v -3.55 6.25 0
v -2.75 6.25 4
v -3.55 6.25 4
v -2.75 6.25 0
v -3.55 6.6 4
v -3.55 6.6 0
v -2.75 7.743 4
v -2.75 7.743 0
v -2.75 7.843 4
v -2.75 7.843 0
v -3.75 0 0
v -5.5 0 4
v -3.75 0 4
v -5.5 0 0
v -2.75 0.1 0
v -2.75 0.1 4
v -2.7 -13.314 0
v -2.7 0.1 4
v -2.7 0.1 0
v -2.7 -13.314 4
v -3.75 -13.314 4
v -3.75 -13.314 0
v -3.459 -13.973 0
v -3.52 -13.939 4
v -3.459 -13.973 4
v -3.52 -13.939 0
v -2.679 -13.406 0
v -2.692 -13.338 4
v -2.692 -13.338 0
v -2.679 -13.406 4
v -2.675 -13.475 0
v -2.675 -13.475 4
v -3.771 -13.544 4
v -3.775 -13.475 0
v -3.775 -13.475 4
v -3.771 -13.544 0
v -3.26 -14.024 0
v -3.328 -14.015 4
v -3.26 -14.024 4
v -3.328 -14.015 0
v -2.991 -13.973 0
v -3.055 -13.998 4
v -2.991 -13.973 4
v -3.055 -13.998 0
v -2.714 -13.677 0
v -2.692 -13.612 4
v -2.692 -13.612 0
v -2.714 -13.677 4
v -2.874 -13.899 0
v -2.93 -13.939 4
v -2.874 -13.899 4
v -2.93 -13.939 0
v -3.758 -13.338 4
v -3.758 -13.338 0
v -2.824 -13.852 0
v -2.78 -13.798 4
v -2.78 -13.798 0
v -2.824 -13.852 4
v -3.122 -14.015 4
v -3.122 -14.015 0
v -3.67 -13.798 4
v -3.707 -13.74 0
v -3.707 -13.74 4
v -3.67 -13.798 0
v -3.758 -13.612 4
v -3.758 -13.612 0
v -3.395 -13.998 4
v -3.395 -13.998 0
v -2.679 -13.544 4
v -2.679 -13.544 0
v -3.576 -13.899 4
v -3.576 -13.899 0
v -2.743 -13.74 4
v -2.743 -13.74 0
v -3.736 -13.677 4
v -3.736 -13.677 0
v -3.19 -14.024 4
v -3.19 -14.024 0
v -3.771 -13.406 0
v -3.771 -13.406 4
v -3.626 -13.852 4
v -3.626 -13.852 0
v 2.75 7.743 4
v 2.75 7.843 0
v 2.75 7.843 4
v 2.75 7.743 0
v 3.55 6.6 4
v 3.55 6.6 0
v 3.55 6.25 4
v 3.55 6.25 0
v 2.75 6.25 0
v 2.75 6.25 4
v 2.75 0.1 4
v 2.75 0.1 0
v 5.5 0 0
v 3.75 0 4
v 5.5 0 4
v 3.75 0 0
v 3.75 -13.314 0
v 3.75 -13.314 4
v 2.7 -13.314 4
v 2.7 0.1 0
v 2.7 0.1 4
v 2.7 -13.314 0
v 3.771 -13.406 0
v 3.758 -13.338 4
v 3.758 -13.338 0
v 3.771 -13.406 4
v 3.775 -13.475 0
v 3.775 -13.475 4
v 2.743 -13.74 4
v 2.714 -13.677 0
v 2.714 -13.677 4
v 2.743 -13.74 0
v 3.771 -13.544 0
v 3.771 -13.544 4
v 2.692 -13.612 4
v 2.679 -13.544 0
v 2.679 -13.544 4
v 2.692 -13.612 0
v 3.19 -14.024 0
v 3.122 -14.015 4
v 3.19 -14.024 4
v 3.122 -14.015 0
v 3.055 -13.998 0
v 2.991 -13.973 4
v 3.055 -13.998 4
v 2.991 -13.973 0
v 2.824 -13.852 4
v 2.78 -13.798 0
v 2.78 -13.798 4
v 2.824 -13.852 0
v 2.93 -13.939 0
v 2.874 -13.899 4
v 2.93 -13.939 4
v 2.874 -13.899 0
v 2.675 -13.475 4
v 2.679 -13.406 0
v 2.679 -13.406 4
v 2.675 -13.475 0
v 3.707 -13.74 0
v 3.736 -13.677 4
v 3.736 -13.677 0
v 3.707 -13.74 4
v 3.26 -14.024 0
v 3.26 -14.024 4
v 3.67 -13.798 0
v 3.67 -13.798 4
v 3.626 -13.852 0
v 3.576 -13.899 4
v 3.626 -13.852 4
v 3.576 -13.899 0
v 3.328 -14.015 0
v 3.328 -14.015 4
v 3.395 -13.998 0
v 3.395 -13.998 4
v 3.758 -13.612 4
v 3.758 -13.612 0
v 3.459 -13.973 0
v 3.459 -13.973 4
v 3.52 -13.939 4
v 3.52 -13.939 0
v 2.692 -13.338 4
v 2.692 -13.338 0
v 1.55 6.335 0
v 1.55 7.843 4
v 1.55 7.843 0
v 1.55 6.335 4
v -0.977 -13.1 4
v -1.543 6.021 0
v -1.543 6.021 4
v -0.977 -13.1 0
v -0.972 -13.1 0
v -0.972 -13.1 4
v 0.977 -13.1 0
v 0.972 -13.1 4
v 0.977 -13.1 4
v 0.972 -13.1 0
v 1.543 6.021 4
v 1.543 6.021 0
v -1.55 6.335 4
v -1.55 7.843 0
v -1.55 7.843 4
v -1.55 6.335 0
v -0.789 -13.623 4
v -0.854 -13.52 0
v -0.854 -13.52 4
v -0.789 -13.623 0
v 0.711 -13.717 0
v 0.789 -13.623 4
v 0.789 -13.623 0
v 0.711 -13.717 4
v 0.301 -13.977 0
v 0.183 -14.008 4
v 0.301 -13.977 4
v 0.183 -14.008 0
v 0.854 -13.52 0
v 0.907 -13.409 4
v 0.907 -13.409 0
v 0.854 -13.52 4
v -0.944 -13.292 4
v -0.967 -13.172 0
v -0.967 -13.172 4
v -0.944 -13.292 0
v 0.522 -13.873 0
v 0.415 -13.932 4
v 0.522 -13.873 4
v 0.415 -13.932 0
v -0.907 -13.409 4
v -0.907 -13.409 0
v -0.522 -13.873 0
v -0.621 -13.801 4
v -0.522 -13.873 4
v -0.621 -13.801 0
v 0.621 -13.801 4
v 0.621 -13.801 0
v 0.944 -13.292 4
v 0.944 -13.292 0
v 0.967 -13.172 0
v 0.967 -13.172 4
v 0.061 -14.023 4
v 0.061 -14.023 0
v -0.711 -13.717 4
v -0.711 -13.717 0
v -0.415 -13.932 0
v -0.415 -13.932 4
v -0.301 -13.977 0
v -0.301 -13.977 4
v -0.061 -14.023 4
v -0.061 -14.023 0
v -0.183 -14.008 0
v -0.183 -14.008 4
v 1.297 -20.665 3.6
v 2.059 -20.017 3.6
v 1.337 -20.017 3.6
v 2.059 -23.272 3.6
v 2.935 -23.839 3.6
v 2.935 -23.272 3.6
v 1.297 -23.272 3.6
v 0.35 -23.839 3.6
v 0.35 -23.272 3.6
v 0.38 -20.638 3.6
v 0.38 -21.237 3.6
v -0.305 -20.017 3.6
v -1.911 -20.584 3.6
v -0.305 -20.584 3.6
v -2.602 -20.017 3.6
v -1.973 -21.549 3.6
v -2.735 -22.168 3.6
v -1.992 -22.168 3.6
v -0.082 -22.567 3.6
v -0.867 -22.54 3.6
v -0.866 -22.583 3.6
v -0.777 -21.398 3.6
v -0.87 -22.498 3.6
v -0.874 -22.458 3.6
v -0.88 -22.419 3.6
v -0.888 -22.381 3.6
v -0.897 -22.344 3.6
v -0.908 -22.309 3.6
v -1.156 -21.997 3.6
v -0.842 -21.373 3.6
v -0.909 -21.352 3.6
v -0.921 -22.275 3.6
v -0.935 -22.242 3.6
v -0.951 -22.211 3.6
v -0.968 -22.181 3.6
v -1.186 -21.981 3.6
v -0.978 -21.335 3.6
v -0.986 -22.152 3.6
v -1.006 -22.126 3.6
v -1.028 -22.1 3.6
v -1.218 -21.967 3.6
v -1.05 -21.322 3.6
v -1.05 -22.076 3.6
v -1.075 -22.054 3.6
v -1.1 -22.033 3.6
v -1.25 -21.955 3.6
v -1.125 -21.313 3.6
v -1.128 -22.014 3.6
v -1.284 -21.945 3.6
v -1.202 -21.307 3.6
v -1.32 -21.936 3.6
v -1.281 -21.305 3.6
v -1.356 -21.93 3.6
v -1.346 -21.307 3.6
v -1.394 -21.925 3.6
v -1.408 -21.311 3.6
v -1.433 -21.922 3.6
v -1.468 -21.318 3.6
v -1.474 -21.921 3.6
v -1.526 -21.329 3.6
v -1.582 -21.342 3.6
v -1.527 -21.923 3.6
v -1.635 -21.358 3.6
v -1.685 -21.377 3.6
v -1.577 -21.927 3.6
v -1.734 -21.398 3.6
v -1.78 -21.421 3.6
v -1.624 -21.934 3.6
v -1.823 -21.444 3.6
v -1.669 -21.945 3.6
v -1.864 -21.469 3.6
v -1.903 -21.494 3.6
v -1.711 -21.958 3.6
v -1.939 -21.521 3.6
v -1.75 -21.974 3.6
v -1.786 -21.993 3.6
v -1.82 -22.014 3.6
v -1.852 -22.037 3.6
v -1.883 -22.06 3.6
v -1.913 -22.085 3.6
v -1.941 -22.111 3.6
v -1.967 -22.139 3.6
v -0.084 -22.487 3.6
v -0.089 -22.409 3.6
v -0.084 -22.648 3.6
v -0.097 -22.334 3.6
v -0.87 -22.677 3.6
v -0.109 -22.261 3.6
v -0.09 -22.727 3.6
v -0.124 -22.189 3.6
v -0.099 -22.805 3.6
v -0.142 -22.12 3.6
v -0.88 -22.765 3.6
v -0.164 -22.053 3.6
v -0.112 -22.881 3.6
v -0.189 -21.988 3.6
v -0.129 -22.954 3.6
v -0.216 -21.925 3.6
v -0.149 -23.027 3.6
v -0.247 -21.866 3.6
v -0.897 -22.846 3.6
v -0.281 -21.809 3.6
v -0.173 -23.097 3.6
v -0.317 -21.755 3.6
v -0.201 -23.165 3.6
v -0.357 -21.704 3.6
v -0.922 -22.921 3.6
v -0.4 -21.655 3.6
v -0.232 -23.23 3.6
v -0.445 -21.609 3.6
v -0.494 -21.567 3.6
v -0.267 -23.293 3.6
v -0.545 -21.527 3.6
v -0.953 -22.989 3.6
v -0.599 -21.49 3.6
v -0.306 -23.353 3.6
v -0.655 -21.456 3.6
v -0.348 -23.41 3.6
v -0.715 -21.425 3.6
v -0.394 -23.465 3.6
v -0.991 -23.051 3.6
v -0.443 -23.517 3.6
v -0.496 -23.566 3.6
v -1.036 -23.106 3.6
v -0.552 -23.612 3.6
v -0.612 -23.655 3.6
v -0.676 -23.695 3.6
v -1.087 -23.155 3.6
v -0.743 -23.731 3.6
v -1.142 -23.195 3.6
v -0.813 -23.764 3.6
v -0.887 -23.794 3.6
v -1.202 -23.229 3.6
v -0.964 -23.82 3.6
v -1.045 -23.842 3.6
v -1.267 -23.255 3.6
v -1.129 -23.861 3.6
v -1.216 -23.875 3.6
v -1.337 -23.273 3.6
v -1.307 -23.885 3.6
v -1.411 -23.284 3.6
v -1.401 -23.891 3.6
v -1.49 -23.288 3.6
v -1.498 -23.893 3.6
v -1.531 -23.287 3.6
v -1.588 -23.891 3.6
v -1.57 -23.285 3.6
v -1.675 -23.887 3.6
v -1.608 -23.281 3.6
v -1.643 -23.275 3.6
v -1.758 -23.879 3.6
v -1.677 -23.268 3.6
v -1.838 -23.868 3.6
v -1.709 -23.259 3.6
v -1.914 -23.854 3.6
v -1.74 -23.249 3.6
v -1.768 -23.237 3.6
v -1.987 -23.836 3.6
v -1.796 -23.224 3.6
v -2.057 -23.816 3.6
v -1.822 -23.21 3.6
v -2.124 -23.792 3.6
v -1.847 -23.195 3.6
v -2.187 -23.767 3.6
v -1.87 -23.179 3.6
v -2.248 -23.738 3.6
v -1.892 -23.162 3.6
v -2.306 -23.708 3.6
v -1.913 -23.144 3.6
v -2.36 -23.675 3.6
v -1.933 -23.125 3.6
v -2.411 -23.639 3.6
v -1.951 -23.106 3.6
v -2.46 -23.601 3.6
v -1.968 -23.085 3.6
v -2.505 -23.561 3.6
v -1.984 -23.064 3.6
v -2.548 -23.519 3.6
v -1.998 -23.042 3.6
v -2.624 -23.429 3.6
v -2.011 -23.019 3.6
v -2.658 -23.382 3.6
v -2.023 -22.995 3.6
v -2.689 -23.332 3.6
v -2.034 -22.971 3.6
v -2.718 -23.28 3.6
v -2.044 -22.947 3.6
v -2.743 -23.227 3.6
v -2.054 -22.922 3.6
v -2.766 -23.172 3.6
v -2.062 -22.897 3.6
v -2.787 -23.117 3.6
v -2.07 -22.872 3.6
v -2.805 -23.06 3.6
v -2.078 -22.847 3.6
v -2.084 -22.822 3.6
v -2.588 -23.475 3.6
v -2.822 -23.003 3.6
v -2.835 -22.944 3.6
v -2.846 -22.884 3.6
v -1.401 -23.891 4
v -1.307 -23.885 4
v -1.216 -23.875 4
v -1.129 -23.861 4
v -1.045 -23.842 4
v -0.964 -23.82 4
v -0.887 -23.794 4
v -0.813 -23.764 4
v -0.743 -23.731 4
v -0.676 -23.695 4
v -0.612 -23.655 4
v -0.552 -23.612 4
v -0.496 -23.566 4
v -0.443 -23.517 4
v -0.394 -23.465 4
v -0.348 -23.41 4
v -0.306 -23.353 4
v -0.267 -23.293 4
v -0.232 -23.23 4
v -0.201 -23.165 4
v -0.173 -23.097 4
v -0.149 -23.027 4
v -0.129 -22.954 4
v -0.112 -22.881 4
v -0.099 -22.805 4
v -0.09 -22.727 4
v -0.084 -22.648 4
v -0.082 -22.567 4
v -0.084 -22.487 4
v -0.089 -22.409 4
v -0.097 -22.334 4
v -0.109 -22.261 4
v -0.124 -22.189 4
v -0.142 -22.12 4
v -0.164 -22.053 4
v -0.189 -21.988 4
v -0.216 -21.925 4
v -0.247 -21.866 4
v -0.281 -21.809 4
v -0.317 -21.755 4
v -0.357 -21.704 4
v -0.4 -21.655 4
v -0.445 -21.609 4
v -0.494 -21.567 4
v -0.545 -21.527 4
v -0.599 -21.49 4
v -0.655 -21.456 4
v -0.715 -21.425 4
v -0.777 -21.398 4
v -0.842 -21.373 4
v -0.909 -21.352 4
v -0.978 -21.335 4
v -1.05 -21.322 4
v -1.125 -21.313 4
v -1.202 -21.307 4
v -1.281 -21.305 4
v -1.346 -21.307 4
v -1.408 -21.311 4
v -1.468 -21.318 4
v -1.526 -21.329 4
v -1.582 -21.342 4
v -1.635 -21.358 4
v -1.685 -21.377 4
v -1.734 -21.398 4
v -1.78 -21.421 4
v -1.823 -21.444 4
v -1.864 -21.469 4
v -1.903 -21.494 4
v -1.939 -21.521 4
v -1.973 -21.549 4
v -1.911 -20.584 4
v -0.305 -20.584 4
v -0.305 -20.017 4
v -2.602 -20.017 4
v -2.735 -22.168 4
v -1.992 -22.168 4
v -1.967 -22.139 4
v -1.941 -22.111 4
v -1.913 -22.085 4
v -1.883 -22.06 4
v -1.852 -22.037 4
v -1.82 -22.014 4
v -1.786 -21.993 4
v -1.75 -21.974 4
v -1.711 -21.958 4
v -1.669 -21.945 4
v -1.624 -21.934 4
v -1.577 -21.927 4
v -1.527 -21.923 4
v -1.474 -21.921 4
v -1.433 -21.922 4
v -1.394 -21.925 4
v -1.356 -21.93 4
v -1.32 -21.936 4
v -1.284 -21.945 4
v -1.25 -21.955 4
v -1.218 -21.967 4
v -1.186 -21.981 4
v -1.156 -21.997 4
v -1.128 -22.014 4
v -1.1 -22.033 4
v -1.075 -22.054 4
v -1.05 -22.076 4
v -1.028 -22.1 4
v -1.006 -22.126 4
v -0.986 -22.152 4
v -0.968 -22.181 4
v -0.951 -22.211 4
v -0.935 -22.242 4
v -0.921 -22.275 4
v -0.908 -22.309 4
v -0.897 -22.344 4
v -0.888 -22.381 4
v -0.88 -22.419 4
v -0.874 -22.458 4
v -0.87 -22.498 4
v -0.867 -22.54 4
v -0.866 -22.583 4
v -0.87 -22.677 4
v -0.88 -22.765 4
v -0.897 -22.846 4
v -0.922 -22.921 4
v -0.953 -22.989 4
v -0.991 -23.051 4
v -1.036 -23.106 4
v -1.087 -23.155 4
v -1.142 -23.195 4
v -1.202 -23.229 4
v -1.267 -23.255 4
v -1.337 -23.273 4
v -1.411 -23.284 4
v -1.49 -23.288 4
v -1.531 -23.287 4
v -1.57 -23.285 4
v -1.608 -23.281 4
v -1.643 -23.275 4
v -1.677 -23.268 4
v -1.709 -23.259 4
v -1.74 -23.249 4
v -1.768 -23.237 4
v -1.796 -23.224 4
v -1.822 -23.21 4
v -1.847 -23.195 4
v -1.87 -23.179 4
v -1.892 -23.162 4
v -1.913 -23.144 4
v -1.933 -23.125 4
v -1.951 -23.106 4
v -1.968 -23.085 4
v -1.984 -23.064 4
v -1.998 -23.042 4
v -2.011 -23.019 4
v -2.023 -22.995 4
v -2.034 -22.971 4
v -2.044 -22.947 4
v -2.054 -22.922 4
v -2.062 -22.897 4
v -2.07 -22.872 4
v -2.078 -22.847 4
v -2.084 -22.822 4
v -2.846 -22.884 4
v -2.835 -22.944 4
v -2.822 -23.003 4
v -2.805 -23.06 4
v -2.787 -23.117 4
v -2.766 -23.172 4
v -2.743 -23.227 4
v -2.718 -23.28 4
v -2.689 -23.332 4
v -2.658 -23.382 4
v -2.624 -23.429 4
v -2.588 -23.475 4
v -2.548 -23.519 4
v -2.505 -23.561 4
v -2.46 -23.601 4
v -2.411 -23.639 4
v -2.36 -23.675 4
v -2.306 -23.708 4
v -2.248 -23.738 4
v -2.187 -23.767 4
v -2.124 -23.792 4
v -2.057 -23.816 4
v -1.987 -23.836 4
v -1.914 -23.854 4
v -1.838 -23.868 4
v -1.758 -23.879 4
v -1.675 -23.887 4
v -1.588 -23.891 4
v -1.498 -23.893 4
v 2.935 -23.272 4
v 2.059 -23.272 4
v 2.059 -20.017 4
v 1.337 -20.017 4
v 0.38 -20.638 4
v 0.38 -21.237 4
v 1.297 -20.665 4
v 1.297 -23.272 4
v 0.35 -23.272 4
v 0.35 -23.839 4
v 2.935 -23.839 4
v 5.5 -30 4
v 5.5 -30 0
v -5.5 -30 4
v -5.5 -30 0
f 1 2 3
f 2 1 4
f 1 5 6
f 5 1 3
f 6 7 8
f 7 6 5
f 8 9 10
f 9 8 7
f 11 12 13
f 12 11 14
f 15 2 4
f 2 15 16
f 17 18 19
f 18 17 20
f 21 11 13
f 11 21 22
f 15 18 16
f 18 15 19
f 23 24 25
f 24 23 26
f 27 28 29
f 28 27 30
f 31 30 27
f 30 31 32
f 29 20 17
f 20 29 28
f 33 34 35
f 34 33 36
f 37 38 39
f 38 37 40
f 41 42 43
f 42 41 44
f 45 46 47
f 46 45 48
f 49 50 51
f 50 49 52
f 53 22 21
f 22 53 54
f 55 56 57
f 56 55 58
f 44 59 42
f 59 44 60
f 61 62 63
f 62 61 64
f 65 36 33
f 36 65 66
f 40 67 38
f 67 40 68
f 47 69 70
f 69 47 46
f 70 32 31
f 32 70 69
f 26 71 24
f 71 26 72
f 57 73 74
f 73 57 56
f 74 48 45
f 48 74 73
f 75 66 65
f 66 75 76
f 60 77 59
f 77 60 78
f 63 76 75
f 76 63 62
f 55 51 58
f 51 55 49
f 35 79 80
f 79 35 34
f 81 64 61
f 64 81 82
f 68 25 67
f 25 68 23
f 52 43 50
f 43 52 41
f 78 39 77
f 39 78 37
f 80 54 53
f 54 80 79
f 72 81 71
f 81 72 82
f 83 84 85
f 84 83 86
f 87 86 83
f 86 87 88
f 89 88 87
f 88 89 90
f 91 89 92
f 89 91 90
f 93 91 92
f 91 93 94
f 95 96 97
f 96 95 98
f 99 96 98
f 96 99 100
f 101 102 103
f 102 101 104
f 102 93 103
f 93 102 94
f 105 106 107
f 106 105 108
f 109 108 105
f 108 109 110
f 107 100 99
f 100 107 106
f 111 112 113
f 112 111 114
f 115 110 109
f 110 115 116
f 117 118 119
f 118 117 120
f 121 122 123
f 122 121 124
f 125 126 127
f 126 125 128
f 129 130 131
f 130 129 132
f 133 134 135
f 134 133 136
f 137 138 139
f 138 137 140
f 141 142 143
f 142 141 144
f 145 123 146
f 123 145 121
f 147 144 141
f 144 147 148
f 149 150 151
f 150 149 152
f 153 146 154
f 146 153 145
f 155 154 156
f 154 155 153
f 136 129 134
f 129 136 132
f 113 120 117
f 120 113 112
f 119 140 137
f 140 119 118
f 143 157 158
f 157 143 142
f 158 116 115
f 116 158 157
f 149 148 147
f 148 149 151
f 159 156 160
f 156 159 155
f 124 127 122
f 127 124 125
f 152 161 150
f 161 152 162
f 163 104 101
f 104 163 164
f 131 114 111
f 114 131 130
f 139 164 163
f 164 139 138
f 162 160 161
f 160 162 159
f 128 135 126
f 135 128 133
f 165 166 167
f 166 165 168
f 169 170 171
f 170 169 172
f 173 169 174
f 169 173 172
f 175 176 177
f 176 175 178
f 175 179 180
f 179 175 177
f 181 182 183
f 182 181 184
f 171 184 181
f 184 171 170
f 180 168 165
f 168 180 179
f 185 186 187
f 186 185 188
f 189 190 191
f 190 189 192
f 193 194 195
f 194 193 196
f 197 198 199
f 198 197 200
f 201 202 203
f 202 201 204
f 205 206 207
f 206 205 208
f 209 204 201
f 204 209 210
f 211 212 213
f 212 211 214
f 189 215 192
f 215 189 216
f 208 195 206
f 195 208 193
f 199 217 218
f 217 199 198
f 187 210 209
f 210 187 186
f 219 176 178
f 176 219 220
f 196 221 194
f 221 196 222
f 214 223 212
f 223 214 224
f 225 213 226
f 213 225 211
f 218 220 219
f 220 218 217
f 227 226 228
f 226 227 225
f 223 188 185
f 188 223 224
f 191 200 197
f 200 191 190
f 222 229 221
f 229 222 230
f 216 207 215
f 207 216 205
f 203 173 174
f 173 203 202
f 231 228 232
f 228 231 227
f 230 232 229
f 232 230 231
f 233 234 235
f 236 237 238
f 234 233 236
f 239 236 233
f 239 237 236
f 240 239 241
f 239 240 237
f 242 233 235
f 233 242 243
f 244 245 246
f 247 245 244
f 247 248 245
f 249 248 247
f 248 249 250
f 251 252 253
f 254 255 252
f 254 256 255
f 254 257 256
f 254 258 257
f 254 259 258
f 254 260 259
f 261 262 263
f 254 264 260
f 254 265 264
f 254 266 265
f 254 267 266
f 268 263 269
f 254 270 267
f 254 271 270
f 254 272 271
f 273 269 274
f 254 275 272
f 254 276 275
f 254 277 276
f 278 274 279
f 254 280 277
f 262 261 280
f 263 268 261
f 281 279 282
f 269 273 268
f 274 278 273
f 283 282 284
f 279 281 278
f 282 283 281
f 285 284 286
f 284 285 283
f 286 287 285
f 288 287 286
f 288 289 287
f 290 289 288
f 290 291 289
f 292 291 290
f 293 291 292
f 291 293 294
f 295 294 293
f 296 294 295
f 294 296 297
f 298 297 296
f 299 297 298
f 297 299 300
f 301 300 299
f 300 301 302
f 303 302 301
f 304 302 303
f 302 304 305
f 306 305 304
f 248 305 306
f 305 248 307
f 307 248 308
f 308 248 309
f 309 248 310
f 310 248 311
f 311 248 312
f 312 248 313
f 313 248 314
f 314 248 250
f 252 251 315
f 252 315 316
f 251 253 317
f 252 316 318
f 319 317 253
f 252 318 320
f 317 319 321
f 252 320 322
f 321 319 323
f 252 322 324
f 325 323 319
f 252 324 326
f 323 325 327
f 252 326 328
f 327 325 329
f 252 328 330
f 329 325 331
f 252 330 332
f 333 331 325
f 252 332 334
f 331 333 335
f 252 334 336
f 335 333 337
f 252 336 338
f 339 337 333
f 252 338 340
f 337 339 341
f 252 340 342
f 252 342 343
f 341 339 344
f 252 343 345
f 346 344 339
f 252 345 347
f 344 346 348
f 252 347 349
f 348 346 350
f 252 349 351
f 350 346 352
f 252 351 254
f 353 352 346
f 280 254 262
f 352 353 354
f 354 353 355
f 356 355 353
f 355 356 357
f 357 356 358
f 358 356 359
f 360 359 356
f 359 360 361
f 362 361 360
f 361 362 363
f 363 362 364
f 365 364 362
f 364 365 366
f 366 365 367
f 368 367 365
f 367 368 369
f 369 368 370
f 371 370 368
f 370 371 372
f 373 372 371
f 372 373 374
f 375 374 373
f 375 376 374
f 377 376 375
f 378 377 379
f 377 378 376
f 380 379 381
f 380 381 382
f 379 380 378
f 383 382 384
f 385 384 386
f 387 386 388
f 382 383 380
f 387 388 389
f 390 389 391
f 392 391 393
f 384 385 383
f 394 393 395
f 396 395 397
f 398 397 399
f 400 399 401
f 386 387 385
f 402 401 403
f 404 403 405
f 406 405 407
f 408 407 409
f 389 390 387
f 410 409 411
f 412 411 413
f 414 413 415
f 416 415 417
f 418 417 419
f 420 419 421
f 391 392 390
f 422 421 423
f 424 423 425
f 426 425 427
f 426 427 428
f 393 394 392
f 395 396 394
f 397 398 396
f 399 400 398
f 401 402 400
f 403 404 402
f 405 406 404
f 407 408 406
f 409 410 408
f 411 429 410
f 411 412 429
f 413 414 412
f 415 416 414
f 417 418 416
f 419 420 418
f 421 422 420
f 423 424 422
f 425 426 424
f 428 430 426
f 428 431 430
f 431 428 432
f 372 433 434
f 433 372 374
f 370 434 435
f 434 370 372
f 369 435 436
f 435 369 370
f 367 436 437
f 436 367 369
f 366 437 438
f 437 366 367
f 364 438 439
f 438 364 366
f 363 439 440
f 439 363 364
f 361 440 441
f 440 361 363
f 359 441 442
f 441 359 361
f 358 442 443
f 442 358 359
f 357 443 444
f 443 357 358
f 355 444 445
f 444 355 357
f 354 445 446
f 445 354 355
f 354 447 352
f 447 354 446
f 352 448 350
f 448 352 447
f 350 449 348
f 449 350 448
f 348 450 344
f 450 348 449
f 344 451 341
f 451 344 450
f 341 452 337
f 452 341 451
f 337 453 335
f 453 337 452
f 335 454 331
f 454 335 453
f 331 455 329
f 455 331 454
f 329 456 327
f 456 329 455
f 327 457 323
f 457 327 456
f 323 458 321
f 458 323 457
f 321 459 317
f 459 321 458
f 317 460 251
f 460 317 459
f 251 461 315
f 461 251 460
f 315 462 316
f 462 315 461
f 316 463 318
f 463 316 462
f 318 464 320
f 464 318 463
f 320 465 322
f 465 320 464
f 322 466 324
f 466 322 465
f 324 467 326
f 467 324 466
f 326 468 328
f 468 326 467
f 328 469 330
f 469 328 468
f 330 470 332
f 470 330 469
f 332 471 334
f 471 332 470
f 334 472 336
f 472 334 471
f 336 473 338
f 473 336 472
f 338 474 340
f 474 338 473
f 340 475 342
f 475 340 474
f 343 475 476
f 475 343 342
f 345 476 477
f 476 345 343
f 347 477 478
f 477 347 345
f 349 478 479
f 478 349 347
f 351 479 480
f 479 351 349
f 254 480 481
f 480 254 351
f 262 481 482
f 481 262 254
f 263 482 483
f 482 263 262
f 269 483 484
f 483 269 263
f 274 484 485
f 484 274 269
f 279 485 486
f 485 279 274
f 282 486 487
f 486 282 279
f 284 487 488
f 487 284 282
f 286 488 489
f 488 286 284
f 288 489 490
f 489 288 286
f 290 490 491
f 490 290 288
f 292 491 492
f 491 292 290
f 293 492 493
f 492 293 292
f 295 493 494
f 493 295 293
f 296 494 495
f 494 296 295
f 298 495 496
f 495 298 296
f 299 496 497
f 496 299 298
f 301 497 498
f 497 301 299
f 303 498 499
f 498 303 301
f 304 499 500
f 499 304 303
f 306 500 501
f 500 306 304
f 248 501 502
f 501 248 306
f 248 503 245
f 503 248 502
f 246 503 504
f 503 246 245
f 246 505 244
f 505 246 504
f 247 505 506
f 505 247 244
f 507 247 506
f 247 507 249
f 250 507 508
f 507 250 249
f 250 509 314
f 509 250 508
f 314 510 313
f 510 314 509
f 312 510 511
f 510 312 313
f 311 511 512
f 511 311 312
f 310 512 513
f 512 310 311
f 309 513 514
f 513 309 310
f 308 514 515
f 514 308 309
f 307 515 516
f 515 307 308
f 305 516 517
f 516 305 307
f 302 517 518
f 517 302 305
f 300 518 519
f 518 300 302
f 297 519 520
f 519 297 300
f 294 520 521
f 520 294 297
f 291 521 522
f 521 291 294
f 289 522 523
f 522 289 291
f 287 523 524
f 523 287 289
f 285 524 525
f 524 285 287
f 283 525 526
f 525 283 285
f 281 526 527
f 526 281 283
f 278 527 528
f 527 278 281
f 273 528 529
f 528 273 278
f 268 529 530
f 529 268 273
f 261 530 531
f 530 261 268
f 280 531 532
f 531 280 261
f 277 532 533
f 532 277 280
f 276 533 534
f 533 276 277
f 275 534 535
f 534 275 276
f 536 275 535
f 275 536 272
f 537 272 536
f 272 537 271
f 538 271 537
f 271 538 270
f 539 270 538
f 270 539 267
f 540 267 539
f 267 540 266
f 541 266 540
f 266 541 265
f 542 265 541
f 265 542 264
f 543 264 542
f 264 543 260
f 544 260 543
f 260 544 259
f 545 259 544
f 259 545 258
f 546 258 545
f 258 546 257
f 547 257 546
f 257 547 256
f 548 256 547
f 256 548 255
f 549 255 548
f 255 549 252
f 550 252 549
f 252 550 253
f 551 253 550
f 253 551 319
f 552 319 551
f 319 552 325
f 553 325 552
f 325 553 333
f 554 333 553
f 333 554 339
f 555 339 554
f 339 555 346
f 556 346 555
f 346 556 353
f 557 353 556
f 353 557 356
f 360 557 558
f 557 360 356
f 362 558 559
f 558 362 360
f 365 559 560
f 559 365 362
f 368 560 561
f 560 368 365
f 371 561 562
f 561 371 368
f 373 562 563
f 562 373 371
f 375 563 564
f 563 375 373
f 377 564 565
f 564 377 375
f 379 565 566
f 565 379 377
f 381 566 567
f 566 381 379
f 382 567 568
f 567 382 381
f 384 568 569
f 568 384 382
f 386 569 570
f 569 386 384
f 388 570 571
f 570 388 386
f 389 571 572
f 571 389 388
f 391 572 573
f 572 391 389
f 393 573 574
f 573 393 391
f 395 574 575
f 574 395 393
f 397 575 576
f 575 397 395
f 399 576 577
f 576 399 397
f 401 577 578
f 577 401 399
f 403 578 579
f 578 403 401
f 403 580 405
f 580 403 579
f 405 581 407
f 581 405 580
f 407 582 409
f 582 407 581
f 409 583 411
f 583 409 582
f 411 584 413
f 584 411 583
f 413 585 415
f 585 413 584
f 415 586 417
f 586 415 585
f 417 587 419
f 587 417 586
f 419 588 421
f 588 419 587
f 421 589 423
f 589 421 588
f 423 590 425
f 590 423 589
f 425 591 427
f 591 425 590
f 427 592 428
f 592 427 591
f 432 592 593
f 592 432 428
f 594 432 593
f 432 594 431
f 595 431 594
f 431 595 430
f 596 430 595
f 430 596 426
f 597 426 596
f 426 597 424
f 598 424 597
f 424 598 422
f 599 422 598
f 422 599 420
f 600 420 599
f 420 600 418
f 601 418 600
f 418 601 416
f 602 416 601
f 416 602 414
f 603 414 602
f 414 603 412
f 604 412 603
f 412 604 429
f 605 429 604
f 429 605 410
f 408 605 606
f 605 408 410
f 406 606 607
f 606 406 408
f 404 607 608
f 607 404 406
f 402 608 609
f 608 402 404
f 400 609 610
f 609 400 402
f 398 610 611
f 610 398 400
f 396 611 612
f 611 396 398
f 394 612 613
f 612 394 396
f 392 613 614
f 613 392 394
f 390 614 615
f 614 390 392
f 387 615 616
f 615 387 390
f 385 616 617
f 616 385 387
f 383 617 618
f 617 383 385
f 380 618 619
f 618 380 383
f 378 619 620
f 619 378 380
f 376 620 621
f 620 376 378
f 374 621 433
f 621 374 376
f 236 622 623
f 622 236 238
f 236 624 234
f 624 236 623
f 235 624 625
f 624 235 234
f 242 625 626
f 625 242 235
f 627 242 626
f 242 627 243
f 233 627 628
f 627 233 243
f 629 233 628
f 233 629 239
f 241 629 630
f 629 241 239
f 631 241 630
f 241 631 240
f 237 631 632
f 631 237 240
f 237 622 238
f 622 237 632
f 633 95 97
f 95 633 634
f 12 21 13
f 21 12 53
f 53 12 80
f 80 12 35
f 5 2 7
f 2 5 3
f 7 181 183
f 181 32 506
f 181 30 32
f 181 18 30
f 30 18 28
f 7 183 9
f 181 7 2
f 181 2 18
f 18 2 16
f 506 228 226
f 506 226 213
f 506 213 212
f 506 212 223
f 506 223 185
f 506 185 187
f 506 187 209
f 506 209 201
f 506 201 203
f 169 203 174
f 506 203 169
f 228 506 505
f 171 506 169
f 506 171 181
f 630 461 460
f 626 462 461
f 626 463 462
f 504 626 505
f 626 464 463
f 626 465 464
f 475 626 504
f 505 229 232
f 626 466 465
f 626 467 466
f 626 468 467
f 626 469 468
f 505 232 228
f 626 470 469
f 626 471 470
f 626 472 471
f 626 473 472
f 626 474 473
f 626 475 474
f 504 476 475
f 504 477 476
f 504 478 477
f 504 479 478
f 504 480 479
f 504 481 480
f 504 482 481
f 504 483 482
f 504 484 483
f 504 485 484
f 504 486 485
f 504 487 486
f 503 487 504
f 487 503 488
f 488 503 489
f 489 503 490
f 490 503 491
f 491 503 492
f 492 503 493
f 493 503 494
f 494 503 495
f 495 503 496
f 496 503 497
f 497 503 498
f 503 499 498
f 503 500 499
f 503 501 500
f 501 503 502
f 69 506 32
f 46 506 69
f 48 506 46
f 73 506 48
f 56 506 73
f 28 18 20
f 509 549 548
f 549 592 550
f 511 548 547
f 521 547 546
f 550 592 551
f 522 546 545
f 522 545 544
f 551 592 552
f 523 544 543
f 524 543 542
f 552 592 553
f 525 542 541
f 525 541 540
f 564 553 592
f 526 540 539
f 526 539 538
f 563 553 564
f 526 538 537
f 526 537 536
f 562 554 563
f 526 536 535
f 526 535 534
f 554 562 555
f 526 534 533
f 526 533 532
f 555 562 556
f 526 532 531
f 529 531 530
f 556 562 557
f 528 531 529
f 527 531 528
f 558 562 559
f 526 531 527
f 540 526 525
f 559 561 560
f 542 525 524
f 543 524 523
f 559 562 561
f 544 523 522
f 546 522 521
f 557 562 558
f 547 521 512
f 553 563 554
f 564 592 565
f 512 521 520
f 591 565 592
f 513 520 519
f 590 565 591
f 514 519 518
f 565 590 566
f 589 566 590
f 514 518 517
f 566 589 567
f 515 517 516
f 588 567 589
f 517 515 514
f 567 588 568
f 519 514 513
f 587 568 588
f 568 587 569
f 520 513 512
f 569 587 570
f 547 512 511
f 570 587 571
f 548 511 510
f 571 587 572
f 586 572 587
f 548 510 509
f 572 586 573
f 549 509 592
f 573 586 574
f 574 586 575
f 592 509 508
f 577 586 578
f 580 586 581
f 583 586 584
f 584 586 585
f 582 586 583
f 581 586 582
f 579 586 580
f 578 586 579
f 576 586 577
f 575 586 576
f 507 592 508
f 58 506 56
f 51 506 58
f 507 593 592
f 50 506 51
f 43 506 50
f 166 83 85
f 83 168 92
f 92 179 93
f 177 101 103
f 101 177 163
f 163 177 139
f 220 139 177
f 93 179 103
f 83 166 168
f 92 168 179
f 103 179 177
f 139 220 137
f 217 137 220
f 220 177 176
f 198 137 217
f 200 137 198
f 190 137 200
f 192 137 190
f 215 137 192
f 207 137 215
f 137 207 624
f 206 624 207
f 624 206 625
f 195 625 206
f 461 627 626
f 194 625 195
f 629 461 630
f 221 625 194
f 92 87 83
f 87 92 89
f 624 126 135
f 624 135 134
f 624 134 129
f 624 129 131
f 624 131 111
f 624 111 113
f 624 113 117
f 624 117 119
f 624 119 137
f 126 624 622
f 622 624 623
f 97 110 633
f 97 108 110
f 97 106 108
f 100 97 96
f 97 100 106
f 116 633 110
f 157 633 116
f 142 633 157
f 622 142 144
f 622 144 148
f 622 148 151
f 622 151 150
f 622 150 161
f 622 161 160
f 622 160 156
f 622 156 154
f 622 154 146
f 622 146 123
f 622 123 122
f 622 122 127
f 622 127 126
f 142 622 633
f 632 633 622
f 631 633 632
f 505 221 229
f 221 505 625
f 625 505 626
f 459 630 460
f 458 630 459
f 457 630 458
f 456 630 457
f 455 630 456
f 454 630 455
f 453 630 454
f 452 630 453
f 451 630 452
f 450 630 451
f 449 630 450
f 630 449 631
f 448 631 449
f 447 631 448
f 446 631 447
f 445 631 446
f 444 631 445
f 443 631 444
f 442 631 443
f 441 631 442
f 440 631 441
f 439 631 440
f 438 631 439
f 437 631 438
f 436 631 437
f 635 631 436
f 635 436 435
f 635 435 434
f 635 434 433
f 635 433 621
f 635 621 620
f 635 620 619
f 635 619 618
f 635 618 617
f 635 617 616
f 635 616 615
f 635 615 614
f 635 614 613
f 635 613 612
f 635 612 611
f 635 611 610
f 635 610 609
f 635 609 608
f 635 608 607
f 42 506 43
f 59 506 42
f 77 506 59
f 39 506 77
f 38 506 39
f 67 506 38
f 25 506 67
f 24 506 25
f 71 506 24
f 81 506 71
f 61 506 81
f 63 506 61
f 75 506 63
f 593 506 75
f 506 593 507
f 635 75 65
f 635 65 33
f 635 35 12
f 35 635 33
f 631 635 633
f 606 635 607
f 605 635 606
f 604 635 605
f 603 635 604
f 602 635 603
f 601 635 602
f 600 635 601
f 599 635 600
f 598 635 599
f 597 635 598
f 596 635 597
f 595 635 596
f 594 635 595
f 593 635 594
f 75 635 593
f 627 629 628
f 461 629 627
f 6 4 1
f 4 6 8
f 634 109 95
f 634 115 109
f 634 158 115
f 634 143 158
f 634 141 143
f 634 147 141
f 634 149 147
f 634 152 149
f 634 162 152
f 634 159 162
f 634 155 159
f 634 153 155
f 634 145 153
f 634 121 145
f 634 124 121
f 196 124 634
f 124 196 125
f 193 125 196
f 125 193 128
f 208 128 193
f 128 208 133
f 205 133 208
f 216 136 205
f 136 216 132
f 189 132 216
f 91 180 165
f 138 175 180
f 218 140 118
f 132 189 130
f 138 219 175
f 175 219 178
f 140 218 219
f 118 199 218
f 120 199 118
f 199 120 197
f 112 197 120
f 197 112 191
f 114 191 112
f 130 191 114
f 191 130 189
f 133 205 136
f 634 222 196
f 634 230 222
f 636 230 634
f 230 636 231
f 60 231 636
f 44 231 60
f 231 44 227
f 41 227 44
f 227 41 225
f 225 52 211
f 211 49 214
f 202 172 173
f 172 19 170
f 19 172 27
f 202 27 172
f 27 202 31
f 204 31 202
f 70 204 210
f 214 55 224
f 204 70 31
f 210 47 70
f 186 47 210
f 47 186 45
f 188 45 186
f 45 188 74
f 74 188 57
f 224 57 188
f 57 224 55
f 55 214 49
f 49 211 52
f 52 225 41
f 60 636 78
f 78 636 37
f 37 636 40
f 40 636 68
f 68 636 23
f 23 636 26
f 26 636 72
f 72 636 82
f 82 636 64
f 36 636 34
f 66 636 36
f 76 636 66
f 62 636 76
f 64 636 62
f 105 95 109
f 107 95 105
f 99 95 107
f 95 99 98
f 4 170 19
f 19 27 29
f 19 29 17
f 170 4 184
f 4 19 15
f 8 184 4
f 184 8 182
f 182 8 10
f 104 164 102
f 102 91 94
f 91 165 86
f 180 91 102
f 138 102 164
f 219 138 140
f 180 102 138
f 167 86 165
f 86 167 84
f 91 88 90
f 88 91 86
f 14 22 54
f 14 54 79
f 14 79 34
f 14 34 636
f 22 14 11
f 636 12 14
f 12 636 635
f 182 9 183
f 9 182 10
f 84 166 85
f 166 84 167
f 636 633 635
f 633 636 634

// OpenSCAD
$fn = 50;

difference() {
	union() {
		translate(v = [0, 0, 0]) {
			rotate(a = [0, 0, 0]) {
				difference() {
					union() {
						translate(v = [-5.5, -30.0, 0]) {
							cube(size = [11.0, 37.84251840539369, 4.0]);
						}
					}
					union() {
						translate(v = [0, 0, -0.1]) {
							linear_extrude(height = 4.2) {
								polygon(points = [[-2.75, 0], [-2.75, 6.25], [-3.55, 6.25], [-3.55, 6.6], [-2.75, 7.7425184053936915], [-2.75, 8.84251840539369], [-5.7, 8.84251840539369], [-5.7, 0]]);
							}
						}
						translate(v = [0, 0, -0.1]) {
							linear_extrude(height = 4.2) {
								polygon(points = [[-2.7, -13.5], [-2.7, -13.1625], [-2.7, -12.825], [-2.7, -12.4875], [-2.7, -12.15], [-2.7, -11.8125], [-2.7, -11.475], [-2.7, -11.1375], [-2.7, -10.8], [-2.7, -10.4625], [-2.7, -10.125], [-2.7, -9.7875], [-2.7, -9.45], [-2.7, -9.1125], [-2.7, -8.775], [-2.7, -8.4375], [-2.7, -8.1], [-2.7, -7.7625], [-2.7, -7.425], [-2.7, -7.0875], [-2.7, -6.75], [-2.7, -6.4125], [-2.7, -6.075], [-2.7, -5.7375], [-2.7, -5.4], [-2.7, -5.0625], [-2.7, -4.725], [-2.7, -4.387499999999999], [-2.7, -4.050000000000001], [-2.7, -3.7125000000000004], [-2.7, -3.375], [-2.7, -3.0374999999999996], [-2.7, -2.6999999999999993], [-2.7, -2.3625000000000007], [-2.7, -2.0250000000000004], [-2.7, -1.6875], [-2.7, -1.3499999999999996], [-2.7, -1.0124999999999993], [-2.7, -0.6750000000000007], [-2.7, -0.33750000000000036], [-2.7, 0.0], [-2.7, 0.1], [-3.75, 0.1], [-3.75, -13.5]]);
							}
						}
						translate(v = [-3.225, -13.475, -0.1]) {
							cylinder(h = 4.2, r = 0.55);
						}
						translate(v = [0, 0, -0.1]) {
							linear_extrude(height = 4.2) {
								polygon(points = [[2.75, 0], [2.75, 6.25], [3.55, 6.25], [3.55, 6.6], [2.75, 7.7425184053936915], [2.75, 8.84251840539369], [5.7, 8.84251840539369], [5.7, 0]]);
							}
						}
						translate(v = [0, 0, -0.1]) {
							linear_extrude(height = 4.2) {
								polygon(points = [[2.7, -13.5], [2.7, -13.1625], [2.7, -12.825], [2.7, -12.4875], [2.7, -12.15], [2.7, -11.8125], [2.7, -11.475], [2.7, -11.1375], [2.7, -10.8], [2.7, -10.4625], [2.7, -10.125], [2.7, -9.7875], [2.7, -9.45], [2.7, -9.1125], [2.7, -8.775], [2.7, -8.4375], [2.7, -8.1], [2.7, -7.7625], [2.7, -7.425], [2.7, -7.0875], [2.7, -6.75], [2.7, -6.4125], [2.7, -6.075], [2.7, -5.7375], [2.7, -5.4], [2.7, -5.0625], [2.7, -4.725], [2.7, -4.387499999999999], [2.7, -4.050000000000001], [2.7, -3.7125000000000004], [2.7, -3.375], [2.7, -3.0374999999999996], [2.7, -2.6999999999999993], [2.7, -2.3625000000000007], [2.7, -2.0250000000000004], [2.7, -1.6875], [2.7, -1.3499999999999996], [2.7, -1.0124999999999993], [2.7, -0.6750000000000007], [2.7, -0.33750000000000036], [2.7, 0.0], [2.7, 0.1], [3.75, 0.1], [3.75, -13.5]]);
							}
						}
						translate(v = [3.225, -13.475, -0.1]) {
							cylinder(h = 4.2, r = 0.55);
						}
						translate(v = [0, 0, -0.1]) {
							linear_extrude(height = 4.2) {
								polygon(points = [[-0.9766666666666666, -13.100000000000001], [-0.9859545051451402, -12.78653545135152], [-0.9952423436236135, -12.47307090270304], [-1.004530182102087, -12.159606354054556], [-1.0138180205805607, -11.846141805406075], [-1.0231058590590343, -11.532677256757594], [-1.0323936975375076, -11.219212708109113], [-1.0416815360159812, -10.905748159460632], [-1.0509693744944548, -10.592283610812151], [-1.0602572129729282, -10.27881906216367], [-1.0695450514514018, -9.965354513515189], [-1.0788328899298754, -9.651889964866706], [-1.088120728408349, -9.338425416218225], [-1.0974085668868223, -9.024960867569744], [-1.106696405365296, -8.711496318921263], [-1.1159842438437693, -8.398031770272782], [-1.1252720823222429, -8.084567221624301], [-1.1345599208007164, -7.771102672975819], [-1.14384775927919, -7.457638124327338], [-1.1531355977576636, -7.144173575678857], [-1.162423436236137, -6.830709027030376], [-1.1717112747146106, -6.517244478381894], [-1.1809991131930841, -6.203779929733412], [-1.1902869516715575, -5.890315381084931], [-1.199574790150031, -5.576850832436449], [-1.2088626286285047, -5.263386283787968], [-1.218150467106978, -4.949921735139487], [-1.2274383055854516, -4.636457186491006], [-1.2367261440639252, -4.322992637842525], [-1.2460139825423986, -4.009528089194044], [-1.2553018210208722, -3.6960635405455626], [-1.2645896594993458, -3.3825989918970816], [-1.2738774979778194, -3.0691344432485987], [-1.283165336456293, -2.7556698946001177], [-1.2924531749347663, -2.4422053459516366], [-1.30174101341324, -2.1287407973031556], [-1.3110288518917135, -1.8152762486546745], [-1.3203166903701868, -1.5018117000061935], [-1.3296045288486604, -1.1883471513577124], [-1.3388923673271338, -0.8748826027092313], [-1.3481802058056074, -0.5614180540607503], [-1.357468044284081, -0.24795350541226746], [-1.3667558827625546, 0.0655110432362136], [-1.376043721241028, 0.37897559188469465], [-1.3853315597195017, 0.6924401405331775], [-1.394619398197975, 1.0059046891816585], [-1.4039072366764487, 1.3193692378301396], [-1.413195075154922, 1.6328337864786189], [-1.4224829136333956, 1.9462983351271035], [-1.4317707521118692, 2.2597628837755845], [-1.4410585905903428, 2.5732274324240656], [-1.4503464290688162, 2.8866919810725467], [-1.4596342675472898, 3.2001565297210277], [-1.4689221060257633, 3.5136210783695105], [-1.4782099445042367, 3.82708562701799], [-1.4874977829827103, 4.140550175666473], [-1.4967856214611839, 4.454014724314952], [-1.5060734599396572, 4.767479272963435], [-1.5153612984181308, 5.080943821611914], [-1.5246491368966044, 5.394408370260397], [-1.5339369753750778, 5.707872918908876], [-1.5432248138535516, 6.021337467557359], [-1.55, 6.334802016205838], [-1.55, 6.648266564854321], [-1.55, 6.961731113502804], [-1.55, 7.275195662151283], [-1.55, 7.588660210799766], [-1.55, 7.902124759448245], [-1.55, 8.215589308096728], [-1.55, 8.529053856745207], [-1.55, 8.84251840539369], [1.55, 8.84251840539369], [1.55, 8.529053856745207], [1.55, 8.215589308096728], [1.55, 7.902124759448245], [1.55, 7.588660210799766], [1.55, 7.275195662151283], [1.55, 6.961731113502804], [1.55, 6.648266564854321], [1.55, 6.334802016205838], [1.5432248138535516, 6.021337467557359], [1.5339369753750778, 5.707872918908876], [1.5246491368966044, 5.394408370260397], [1.5153612984181308, 5.080943821611914], [1.5060734599396572, 4.767479272963435], [1.4967856214611839, 4.454014724314952], [1.4874977829827103, 4.140550175666473], [1.4782099445042367, 3.82708562701799], [1.4689221060257633, 3.5136210783695105], [1.4596342675472898, 3.2001565297210277], [1.4503464290688162, 2.8866919810725467], [1.4410585905903428, 2.5732274324240656], [1.4317707521118692, 2.2597628837755845], [1.4224829136333956, 1.9462983351271035], [1.413195075154922, 1.6328337864786189], [1.4039072366764487, 1.3193692378301396], [1.394619398197975, 1.0059046891816585], [1.3853315597195017, 0.6924401405331775], [1.376043721241028, 0.37897559188469465], [1.3667558827625546, 0.0655110432362136], [1.357468044284081, -0.24795350541226746], [1.3481802058056074, -0.5614180540607503], [1.3388923673271338, -0.8748826027092313], [1.3296045288486604, -1.1883471513577124], [1.3203166903701868, -1.5018117000061935], [1.3110288518917135, -1.8152762486546745], [1.30174101341324, -2.1287407973031556], [1.2924531749347663, -2.4422053459516366], [1.283165336456293, -2.7556698946001177], [1.2738774979778194, -3.0691344432485987], [1.2645896594993458, -3.3825989918970816], [1.2553018210208722, -3.6960635405455626], [1.2460139825423986, -4.009528089194044], [1.2367261440639252, -4.322992637842525], [1.2274383055854516, -4.636457186491006], [1.218150467106978, -4.949921735139487], [1.2088626286285047, -5.263386283787968], [1.199574790150031, -5.576850832436449], [1.1902869516715575, -5.890315381084931], [1.1809991131930841, -6.203779929733412], [1.1717112747146106, -6.517244478381894], [1.162423436236137, -6.830709027030376], [1.1531355977576636, -7.144173575678857], [1.14384775927919, -7.457638124327338], [1.1345599208007164, -7.771102672975819], [1.1252720823222429, -8.084567221624301], [1.1159842438437693, -8.398031770272782], [1.106696405365296, -8.711496318921263], [1.0974085668868223, -9.024960867569744], [1.088120728408349, -9.338425416218225], [1.0788328899298754, -9.651889964866706], [1.0695450514514018, -9.965354513515189], [1.0602572129729282, -10.27881906216367], [1.0509693744944548, -10.592283610812151], [1.0416815360159812, -10.905748159460632], [1.0323936975375076, -11.219212708109113], [1.0231058590590343, -11.532677256757594], [1.0138180205805607, -11.846141805406075], [1.004530182102087, -12.159606354054556], [0.9952423436236135, -12.47307090270304], [0.9859545051451402, -12.78653545135152], [0.9766666666666666, -13.100000000000001]]);
							}
						}
						translate(v = [0, -13.05, -0.1]) {
							cylinder(h = 4.2, r = 0.975);
						}
						translate(v = [0, -22, 3.6]) {
							linear_extrude(height = 0.5) {
								text(font = "Arial:style=Bold", halign = "center", size = 4.0, text = "51", valign = "center");
							}
						}
					}
				}
			}
		}
	}
	union();
}
